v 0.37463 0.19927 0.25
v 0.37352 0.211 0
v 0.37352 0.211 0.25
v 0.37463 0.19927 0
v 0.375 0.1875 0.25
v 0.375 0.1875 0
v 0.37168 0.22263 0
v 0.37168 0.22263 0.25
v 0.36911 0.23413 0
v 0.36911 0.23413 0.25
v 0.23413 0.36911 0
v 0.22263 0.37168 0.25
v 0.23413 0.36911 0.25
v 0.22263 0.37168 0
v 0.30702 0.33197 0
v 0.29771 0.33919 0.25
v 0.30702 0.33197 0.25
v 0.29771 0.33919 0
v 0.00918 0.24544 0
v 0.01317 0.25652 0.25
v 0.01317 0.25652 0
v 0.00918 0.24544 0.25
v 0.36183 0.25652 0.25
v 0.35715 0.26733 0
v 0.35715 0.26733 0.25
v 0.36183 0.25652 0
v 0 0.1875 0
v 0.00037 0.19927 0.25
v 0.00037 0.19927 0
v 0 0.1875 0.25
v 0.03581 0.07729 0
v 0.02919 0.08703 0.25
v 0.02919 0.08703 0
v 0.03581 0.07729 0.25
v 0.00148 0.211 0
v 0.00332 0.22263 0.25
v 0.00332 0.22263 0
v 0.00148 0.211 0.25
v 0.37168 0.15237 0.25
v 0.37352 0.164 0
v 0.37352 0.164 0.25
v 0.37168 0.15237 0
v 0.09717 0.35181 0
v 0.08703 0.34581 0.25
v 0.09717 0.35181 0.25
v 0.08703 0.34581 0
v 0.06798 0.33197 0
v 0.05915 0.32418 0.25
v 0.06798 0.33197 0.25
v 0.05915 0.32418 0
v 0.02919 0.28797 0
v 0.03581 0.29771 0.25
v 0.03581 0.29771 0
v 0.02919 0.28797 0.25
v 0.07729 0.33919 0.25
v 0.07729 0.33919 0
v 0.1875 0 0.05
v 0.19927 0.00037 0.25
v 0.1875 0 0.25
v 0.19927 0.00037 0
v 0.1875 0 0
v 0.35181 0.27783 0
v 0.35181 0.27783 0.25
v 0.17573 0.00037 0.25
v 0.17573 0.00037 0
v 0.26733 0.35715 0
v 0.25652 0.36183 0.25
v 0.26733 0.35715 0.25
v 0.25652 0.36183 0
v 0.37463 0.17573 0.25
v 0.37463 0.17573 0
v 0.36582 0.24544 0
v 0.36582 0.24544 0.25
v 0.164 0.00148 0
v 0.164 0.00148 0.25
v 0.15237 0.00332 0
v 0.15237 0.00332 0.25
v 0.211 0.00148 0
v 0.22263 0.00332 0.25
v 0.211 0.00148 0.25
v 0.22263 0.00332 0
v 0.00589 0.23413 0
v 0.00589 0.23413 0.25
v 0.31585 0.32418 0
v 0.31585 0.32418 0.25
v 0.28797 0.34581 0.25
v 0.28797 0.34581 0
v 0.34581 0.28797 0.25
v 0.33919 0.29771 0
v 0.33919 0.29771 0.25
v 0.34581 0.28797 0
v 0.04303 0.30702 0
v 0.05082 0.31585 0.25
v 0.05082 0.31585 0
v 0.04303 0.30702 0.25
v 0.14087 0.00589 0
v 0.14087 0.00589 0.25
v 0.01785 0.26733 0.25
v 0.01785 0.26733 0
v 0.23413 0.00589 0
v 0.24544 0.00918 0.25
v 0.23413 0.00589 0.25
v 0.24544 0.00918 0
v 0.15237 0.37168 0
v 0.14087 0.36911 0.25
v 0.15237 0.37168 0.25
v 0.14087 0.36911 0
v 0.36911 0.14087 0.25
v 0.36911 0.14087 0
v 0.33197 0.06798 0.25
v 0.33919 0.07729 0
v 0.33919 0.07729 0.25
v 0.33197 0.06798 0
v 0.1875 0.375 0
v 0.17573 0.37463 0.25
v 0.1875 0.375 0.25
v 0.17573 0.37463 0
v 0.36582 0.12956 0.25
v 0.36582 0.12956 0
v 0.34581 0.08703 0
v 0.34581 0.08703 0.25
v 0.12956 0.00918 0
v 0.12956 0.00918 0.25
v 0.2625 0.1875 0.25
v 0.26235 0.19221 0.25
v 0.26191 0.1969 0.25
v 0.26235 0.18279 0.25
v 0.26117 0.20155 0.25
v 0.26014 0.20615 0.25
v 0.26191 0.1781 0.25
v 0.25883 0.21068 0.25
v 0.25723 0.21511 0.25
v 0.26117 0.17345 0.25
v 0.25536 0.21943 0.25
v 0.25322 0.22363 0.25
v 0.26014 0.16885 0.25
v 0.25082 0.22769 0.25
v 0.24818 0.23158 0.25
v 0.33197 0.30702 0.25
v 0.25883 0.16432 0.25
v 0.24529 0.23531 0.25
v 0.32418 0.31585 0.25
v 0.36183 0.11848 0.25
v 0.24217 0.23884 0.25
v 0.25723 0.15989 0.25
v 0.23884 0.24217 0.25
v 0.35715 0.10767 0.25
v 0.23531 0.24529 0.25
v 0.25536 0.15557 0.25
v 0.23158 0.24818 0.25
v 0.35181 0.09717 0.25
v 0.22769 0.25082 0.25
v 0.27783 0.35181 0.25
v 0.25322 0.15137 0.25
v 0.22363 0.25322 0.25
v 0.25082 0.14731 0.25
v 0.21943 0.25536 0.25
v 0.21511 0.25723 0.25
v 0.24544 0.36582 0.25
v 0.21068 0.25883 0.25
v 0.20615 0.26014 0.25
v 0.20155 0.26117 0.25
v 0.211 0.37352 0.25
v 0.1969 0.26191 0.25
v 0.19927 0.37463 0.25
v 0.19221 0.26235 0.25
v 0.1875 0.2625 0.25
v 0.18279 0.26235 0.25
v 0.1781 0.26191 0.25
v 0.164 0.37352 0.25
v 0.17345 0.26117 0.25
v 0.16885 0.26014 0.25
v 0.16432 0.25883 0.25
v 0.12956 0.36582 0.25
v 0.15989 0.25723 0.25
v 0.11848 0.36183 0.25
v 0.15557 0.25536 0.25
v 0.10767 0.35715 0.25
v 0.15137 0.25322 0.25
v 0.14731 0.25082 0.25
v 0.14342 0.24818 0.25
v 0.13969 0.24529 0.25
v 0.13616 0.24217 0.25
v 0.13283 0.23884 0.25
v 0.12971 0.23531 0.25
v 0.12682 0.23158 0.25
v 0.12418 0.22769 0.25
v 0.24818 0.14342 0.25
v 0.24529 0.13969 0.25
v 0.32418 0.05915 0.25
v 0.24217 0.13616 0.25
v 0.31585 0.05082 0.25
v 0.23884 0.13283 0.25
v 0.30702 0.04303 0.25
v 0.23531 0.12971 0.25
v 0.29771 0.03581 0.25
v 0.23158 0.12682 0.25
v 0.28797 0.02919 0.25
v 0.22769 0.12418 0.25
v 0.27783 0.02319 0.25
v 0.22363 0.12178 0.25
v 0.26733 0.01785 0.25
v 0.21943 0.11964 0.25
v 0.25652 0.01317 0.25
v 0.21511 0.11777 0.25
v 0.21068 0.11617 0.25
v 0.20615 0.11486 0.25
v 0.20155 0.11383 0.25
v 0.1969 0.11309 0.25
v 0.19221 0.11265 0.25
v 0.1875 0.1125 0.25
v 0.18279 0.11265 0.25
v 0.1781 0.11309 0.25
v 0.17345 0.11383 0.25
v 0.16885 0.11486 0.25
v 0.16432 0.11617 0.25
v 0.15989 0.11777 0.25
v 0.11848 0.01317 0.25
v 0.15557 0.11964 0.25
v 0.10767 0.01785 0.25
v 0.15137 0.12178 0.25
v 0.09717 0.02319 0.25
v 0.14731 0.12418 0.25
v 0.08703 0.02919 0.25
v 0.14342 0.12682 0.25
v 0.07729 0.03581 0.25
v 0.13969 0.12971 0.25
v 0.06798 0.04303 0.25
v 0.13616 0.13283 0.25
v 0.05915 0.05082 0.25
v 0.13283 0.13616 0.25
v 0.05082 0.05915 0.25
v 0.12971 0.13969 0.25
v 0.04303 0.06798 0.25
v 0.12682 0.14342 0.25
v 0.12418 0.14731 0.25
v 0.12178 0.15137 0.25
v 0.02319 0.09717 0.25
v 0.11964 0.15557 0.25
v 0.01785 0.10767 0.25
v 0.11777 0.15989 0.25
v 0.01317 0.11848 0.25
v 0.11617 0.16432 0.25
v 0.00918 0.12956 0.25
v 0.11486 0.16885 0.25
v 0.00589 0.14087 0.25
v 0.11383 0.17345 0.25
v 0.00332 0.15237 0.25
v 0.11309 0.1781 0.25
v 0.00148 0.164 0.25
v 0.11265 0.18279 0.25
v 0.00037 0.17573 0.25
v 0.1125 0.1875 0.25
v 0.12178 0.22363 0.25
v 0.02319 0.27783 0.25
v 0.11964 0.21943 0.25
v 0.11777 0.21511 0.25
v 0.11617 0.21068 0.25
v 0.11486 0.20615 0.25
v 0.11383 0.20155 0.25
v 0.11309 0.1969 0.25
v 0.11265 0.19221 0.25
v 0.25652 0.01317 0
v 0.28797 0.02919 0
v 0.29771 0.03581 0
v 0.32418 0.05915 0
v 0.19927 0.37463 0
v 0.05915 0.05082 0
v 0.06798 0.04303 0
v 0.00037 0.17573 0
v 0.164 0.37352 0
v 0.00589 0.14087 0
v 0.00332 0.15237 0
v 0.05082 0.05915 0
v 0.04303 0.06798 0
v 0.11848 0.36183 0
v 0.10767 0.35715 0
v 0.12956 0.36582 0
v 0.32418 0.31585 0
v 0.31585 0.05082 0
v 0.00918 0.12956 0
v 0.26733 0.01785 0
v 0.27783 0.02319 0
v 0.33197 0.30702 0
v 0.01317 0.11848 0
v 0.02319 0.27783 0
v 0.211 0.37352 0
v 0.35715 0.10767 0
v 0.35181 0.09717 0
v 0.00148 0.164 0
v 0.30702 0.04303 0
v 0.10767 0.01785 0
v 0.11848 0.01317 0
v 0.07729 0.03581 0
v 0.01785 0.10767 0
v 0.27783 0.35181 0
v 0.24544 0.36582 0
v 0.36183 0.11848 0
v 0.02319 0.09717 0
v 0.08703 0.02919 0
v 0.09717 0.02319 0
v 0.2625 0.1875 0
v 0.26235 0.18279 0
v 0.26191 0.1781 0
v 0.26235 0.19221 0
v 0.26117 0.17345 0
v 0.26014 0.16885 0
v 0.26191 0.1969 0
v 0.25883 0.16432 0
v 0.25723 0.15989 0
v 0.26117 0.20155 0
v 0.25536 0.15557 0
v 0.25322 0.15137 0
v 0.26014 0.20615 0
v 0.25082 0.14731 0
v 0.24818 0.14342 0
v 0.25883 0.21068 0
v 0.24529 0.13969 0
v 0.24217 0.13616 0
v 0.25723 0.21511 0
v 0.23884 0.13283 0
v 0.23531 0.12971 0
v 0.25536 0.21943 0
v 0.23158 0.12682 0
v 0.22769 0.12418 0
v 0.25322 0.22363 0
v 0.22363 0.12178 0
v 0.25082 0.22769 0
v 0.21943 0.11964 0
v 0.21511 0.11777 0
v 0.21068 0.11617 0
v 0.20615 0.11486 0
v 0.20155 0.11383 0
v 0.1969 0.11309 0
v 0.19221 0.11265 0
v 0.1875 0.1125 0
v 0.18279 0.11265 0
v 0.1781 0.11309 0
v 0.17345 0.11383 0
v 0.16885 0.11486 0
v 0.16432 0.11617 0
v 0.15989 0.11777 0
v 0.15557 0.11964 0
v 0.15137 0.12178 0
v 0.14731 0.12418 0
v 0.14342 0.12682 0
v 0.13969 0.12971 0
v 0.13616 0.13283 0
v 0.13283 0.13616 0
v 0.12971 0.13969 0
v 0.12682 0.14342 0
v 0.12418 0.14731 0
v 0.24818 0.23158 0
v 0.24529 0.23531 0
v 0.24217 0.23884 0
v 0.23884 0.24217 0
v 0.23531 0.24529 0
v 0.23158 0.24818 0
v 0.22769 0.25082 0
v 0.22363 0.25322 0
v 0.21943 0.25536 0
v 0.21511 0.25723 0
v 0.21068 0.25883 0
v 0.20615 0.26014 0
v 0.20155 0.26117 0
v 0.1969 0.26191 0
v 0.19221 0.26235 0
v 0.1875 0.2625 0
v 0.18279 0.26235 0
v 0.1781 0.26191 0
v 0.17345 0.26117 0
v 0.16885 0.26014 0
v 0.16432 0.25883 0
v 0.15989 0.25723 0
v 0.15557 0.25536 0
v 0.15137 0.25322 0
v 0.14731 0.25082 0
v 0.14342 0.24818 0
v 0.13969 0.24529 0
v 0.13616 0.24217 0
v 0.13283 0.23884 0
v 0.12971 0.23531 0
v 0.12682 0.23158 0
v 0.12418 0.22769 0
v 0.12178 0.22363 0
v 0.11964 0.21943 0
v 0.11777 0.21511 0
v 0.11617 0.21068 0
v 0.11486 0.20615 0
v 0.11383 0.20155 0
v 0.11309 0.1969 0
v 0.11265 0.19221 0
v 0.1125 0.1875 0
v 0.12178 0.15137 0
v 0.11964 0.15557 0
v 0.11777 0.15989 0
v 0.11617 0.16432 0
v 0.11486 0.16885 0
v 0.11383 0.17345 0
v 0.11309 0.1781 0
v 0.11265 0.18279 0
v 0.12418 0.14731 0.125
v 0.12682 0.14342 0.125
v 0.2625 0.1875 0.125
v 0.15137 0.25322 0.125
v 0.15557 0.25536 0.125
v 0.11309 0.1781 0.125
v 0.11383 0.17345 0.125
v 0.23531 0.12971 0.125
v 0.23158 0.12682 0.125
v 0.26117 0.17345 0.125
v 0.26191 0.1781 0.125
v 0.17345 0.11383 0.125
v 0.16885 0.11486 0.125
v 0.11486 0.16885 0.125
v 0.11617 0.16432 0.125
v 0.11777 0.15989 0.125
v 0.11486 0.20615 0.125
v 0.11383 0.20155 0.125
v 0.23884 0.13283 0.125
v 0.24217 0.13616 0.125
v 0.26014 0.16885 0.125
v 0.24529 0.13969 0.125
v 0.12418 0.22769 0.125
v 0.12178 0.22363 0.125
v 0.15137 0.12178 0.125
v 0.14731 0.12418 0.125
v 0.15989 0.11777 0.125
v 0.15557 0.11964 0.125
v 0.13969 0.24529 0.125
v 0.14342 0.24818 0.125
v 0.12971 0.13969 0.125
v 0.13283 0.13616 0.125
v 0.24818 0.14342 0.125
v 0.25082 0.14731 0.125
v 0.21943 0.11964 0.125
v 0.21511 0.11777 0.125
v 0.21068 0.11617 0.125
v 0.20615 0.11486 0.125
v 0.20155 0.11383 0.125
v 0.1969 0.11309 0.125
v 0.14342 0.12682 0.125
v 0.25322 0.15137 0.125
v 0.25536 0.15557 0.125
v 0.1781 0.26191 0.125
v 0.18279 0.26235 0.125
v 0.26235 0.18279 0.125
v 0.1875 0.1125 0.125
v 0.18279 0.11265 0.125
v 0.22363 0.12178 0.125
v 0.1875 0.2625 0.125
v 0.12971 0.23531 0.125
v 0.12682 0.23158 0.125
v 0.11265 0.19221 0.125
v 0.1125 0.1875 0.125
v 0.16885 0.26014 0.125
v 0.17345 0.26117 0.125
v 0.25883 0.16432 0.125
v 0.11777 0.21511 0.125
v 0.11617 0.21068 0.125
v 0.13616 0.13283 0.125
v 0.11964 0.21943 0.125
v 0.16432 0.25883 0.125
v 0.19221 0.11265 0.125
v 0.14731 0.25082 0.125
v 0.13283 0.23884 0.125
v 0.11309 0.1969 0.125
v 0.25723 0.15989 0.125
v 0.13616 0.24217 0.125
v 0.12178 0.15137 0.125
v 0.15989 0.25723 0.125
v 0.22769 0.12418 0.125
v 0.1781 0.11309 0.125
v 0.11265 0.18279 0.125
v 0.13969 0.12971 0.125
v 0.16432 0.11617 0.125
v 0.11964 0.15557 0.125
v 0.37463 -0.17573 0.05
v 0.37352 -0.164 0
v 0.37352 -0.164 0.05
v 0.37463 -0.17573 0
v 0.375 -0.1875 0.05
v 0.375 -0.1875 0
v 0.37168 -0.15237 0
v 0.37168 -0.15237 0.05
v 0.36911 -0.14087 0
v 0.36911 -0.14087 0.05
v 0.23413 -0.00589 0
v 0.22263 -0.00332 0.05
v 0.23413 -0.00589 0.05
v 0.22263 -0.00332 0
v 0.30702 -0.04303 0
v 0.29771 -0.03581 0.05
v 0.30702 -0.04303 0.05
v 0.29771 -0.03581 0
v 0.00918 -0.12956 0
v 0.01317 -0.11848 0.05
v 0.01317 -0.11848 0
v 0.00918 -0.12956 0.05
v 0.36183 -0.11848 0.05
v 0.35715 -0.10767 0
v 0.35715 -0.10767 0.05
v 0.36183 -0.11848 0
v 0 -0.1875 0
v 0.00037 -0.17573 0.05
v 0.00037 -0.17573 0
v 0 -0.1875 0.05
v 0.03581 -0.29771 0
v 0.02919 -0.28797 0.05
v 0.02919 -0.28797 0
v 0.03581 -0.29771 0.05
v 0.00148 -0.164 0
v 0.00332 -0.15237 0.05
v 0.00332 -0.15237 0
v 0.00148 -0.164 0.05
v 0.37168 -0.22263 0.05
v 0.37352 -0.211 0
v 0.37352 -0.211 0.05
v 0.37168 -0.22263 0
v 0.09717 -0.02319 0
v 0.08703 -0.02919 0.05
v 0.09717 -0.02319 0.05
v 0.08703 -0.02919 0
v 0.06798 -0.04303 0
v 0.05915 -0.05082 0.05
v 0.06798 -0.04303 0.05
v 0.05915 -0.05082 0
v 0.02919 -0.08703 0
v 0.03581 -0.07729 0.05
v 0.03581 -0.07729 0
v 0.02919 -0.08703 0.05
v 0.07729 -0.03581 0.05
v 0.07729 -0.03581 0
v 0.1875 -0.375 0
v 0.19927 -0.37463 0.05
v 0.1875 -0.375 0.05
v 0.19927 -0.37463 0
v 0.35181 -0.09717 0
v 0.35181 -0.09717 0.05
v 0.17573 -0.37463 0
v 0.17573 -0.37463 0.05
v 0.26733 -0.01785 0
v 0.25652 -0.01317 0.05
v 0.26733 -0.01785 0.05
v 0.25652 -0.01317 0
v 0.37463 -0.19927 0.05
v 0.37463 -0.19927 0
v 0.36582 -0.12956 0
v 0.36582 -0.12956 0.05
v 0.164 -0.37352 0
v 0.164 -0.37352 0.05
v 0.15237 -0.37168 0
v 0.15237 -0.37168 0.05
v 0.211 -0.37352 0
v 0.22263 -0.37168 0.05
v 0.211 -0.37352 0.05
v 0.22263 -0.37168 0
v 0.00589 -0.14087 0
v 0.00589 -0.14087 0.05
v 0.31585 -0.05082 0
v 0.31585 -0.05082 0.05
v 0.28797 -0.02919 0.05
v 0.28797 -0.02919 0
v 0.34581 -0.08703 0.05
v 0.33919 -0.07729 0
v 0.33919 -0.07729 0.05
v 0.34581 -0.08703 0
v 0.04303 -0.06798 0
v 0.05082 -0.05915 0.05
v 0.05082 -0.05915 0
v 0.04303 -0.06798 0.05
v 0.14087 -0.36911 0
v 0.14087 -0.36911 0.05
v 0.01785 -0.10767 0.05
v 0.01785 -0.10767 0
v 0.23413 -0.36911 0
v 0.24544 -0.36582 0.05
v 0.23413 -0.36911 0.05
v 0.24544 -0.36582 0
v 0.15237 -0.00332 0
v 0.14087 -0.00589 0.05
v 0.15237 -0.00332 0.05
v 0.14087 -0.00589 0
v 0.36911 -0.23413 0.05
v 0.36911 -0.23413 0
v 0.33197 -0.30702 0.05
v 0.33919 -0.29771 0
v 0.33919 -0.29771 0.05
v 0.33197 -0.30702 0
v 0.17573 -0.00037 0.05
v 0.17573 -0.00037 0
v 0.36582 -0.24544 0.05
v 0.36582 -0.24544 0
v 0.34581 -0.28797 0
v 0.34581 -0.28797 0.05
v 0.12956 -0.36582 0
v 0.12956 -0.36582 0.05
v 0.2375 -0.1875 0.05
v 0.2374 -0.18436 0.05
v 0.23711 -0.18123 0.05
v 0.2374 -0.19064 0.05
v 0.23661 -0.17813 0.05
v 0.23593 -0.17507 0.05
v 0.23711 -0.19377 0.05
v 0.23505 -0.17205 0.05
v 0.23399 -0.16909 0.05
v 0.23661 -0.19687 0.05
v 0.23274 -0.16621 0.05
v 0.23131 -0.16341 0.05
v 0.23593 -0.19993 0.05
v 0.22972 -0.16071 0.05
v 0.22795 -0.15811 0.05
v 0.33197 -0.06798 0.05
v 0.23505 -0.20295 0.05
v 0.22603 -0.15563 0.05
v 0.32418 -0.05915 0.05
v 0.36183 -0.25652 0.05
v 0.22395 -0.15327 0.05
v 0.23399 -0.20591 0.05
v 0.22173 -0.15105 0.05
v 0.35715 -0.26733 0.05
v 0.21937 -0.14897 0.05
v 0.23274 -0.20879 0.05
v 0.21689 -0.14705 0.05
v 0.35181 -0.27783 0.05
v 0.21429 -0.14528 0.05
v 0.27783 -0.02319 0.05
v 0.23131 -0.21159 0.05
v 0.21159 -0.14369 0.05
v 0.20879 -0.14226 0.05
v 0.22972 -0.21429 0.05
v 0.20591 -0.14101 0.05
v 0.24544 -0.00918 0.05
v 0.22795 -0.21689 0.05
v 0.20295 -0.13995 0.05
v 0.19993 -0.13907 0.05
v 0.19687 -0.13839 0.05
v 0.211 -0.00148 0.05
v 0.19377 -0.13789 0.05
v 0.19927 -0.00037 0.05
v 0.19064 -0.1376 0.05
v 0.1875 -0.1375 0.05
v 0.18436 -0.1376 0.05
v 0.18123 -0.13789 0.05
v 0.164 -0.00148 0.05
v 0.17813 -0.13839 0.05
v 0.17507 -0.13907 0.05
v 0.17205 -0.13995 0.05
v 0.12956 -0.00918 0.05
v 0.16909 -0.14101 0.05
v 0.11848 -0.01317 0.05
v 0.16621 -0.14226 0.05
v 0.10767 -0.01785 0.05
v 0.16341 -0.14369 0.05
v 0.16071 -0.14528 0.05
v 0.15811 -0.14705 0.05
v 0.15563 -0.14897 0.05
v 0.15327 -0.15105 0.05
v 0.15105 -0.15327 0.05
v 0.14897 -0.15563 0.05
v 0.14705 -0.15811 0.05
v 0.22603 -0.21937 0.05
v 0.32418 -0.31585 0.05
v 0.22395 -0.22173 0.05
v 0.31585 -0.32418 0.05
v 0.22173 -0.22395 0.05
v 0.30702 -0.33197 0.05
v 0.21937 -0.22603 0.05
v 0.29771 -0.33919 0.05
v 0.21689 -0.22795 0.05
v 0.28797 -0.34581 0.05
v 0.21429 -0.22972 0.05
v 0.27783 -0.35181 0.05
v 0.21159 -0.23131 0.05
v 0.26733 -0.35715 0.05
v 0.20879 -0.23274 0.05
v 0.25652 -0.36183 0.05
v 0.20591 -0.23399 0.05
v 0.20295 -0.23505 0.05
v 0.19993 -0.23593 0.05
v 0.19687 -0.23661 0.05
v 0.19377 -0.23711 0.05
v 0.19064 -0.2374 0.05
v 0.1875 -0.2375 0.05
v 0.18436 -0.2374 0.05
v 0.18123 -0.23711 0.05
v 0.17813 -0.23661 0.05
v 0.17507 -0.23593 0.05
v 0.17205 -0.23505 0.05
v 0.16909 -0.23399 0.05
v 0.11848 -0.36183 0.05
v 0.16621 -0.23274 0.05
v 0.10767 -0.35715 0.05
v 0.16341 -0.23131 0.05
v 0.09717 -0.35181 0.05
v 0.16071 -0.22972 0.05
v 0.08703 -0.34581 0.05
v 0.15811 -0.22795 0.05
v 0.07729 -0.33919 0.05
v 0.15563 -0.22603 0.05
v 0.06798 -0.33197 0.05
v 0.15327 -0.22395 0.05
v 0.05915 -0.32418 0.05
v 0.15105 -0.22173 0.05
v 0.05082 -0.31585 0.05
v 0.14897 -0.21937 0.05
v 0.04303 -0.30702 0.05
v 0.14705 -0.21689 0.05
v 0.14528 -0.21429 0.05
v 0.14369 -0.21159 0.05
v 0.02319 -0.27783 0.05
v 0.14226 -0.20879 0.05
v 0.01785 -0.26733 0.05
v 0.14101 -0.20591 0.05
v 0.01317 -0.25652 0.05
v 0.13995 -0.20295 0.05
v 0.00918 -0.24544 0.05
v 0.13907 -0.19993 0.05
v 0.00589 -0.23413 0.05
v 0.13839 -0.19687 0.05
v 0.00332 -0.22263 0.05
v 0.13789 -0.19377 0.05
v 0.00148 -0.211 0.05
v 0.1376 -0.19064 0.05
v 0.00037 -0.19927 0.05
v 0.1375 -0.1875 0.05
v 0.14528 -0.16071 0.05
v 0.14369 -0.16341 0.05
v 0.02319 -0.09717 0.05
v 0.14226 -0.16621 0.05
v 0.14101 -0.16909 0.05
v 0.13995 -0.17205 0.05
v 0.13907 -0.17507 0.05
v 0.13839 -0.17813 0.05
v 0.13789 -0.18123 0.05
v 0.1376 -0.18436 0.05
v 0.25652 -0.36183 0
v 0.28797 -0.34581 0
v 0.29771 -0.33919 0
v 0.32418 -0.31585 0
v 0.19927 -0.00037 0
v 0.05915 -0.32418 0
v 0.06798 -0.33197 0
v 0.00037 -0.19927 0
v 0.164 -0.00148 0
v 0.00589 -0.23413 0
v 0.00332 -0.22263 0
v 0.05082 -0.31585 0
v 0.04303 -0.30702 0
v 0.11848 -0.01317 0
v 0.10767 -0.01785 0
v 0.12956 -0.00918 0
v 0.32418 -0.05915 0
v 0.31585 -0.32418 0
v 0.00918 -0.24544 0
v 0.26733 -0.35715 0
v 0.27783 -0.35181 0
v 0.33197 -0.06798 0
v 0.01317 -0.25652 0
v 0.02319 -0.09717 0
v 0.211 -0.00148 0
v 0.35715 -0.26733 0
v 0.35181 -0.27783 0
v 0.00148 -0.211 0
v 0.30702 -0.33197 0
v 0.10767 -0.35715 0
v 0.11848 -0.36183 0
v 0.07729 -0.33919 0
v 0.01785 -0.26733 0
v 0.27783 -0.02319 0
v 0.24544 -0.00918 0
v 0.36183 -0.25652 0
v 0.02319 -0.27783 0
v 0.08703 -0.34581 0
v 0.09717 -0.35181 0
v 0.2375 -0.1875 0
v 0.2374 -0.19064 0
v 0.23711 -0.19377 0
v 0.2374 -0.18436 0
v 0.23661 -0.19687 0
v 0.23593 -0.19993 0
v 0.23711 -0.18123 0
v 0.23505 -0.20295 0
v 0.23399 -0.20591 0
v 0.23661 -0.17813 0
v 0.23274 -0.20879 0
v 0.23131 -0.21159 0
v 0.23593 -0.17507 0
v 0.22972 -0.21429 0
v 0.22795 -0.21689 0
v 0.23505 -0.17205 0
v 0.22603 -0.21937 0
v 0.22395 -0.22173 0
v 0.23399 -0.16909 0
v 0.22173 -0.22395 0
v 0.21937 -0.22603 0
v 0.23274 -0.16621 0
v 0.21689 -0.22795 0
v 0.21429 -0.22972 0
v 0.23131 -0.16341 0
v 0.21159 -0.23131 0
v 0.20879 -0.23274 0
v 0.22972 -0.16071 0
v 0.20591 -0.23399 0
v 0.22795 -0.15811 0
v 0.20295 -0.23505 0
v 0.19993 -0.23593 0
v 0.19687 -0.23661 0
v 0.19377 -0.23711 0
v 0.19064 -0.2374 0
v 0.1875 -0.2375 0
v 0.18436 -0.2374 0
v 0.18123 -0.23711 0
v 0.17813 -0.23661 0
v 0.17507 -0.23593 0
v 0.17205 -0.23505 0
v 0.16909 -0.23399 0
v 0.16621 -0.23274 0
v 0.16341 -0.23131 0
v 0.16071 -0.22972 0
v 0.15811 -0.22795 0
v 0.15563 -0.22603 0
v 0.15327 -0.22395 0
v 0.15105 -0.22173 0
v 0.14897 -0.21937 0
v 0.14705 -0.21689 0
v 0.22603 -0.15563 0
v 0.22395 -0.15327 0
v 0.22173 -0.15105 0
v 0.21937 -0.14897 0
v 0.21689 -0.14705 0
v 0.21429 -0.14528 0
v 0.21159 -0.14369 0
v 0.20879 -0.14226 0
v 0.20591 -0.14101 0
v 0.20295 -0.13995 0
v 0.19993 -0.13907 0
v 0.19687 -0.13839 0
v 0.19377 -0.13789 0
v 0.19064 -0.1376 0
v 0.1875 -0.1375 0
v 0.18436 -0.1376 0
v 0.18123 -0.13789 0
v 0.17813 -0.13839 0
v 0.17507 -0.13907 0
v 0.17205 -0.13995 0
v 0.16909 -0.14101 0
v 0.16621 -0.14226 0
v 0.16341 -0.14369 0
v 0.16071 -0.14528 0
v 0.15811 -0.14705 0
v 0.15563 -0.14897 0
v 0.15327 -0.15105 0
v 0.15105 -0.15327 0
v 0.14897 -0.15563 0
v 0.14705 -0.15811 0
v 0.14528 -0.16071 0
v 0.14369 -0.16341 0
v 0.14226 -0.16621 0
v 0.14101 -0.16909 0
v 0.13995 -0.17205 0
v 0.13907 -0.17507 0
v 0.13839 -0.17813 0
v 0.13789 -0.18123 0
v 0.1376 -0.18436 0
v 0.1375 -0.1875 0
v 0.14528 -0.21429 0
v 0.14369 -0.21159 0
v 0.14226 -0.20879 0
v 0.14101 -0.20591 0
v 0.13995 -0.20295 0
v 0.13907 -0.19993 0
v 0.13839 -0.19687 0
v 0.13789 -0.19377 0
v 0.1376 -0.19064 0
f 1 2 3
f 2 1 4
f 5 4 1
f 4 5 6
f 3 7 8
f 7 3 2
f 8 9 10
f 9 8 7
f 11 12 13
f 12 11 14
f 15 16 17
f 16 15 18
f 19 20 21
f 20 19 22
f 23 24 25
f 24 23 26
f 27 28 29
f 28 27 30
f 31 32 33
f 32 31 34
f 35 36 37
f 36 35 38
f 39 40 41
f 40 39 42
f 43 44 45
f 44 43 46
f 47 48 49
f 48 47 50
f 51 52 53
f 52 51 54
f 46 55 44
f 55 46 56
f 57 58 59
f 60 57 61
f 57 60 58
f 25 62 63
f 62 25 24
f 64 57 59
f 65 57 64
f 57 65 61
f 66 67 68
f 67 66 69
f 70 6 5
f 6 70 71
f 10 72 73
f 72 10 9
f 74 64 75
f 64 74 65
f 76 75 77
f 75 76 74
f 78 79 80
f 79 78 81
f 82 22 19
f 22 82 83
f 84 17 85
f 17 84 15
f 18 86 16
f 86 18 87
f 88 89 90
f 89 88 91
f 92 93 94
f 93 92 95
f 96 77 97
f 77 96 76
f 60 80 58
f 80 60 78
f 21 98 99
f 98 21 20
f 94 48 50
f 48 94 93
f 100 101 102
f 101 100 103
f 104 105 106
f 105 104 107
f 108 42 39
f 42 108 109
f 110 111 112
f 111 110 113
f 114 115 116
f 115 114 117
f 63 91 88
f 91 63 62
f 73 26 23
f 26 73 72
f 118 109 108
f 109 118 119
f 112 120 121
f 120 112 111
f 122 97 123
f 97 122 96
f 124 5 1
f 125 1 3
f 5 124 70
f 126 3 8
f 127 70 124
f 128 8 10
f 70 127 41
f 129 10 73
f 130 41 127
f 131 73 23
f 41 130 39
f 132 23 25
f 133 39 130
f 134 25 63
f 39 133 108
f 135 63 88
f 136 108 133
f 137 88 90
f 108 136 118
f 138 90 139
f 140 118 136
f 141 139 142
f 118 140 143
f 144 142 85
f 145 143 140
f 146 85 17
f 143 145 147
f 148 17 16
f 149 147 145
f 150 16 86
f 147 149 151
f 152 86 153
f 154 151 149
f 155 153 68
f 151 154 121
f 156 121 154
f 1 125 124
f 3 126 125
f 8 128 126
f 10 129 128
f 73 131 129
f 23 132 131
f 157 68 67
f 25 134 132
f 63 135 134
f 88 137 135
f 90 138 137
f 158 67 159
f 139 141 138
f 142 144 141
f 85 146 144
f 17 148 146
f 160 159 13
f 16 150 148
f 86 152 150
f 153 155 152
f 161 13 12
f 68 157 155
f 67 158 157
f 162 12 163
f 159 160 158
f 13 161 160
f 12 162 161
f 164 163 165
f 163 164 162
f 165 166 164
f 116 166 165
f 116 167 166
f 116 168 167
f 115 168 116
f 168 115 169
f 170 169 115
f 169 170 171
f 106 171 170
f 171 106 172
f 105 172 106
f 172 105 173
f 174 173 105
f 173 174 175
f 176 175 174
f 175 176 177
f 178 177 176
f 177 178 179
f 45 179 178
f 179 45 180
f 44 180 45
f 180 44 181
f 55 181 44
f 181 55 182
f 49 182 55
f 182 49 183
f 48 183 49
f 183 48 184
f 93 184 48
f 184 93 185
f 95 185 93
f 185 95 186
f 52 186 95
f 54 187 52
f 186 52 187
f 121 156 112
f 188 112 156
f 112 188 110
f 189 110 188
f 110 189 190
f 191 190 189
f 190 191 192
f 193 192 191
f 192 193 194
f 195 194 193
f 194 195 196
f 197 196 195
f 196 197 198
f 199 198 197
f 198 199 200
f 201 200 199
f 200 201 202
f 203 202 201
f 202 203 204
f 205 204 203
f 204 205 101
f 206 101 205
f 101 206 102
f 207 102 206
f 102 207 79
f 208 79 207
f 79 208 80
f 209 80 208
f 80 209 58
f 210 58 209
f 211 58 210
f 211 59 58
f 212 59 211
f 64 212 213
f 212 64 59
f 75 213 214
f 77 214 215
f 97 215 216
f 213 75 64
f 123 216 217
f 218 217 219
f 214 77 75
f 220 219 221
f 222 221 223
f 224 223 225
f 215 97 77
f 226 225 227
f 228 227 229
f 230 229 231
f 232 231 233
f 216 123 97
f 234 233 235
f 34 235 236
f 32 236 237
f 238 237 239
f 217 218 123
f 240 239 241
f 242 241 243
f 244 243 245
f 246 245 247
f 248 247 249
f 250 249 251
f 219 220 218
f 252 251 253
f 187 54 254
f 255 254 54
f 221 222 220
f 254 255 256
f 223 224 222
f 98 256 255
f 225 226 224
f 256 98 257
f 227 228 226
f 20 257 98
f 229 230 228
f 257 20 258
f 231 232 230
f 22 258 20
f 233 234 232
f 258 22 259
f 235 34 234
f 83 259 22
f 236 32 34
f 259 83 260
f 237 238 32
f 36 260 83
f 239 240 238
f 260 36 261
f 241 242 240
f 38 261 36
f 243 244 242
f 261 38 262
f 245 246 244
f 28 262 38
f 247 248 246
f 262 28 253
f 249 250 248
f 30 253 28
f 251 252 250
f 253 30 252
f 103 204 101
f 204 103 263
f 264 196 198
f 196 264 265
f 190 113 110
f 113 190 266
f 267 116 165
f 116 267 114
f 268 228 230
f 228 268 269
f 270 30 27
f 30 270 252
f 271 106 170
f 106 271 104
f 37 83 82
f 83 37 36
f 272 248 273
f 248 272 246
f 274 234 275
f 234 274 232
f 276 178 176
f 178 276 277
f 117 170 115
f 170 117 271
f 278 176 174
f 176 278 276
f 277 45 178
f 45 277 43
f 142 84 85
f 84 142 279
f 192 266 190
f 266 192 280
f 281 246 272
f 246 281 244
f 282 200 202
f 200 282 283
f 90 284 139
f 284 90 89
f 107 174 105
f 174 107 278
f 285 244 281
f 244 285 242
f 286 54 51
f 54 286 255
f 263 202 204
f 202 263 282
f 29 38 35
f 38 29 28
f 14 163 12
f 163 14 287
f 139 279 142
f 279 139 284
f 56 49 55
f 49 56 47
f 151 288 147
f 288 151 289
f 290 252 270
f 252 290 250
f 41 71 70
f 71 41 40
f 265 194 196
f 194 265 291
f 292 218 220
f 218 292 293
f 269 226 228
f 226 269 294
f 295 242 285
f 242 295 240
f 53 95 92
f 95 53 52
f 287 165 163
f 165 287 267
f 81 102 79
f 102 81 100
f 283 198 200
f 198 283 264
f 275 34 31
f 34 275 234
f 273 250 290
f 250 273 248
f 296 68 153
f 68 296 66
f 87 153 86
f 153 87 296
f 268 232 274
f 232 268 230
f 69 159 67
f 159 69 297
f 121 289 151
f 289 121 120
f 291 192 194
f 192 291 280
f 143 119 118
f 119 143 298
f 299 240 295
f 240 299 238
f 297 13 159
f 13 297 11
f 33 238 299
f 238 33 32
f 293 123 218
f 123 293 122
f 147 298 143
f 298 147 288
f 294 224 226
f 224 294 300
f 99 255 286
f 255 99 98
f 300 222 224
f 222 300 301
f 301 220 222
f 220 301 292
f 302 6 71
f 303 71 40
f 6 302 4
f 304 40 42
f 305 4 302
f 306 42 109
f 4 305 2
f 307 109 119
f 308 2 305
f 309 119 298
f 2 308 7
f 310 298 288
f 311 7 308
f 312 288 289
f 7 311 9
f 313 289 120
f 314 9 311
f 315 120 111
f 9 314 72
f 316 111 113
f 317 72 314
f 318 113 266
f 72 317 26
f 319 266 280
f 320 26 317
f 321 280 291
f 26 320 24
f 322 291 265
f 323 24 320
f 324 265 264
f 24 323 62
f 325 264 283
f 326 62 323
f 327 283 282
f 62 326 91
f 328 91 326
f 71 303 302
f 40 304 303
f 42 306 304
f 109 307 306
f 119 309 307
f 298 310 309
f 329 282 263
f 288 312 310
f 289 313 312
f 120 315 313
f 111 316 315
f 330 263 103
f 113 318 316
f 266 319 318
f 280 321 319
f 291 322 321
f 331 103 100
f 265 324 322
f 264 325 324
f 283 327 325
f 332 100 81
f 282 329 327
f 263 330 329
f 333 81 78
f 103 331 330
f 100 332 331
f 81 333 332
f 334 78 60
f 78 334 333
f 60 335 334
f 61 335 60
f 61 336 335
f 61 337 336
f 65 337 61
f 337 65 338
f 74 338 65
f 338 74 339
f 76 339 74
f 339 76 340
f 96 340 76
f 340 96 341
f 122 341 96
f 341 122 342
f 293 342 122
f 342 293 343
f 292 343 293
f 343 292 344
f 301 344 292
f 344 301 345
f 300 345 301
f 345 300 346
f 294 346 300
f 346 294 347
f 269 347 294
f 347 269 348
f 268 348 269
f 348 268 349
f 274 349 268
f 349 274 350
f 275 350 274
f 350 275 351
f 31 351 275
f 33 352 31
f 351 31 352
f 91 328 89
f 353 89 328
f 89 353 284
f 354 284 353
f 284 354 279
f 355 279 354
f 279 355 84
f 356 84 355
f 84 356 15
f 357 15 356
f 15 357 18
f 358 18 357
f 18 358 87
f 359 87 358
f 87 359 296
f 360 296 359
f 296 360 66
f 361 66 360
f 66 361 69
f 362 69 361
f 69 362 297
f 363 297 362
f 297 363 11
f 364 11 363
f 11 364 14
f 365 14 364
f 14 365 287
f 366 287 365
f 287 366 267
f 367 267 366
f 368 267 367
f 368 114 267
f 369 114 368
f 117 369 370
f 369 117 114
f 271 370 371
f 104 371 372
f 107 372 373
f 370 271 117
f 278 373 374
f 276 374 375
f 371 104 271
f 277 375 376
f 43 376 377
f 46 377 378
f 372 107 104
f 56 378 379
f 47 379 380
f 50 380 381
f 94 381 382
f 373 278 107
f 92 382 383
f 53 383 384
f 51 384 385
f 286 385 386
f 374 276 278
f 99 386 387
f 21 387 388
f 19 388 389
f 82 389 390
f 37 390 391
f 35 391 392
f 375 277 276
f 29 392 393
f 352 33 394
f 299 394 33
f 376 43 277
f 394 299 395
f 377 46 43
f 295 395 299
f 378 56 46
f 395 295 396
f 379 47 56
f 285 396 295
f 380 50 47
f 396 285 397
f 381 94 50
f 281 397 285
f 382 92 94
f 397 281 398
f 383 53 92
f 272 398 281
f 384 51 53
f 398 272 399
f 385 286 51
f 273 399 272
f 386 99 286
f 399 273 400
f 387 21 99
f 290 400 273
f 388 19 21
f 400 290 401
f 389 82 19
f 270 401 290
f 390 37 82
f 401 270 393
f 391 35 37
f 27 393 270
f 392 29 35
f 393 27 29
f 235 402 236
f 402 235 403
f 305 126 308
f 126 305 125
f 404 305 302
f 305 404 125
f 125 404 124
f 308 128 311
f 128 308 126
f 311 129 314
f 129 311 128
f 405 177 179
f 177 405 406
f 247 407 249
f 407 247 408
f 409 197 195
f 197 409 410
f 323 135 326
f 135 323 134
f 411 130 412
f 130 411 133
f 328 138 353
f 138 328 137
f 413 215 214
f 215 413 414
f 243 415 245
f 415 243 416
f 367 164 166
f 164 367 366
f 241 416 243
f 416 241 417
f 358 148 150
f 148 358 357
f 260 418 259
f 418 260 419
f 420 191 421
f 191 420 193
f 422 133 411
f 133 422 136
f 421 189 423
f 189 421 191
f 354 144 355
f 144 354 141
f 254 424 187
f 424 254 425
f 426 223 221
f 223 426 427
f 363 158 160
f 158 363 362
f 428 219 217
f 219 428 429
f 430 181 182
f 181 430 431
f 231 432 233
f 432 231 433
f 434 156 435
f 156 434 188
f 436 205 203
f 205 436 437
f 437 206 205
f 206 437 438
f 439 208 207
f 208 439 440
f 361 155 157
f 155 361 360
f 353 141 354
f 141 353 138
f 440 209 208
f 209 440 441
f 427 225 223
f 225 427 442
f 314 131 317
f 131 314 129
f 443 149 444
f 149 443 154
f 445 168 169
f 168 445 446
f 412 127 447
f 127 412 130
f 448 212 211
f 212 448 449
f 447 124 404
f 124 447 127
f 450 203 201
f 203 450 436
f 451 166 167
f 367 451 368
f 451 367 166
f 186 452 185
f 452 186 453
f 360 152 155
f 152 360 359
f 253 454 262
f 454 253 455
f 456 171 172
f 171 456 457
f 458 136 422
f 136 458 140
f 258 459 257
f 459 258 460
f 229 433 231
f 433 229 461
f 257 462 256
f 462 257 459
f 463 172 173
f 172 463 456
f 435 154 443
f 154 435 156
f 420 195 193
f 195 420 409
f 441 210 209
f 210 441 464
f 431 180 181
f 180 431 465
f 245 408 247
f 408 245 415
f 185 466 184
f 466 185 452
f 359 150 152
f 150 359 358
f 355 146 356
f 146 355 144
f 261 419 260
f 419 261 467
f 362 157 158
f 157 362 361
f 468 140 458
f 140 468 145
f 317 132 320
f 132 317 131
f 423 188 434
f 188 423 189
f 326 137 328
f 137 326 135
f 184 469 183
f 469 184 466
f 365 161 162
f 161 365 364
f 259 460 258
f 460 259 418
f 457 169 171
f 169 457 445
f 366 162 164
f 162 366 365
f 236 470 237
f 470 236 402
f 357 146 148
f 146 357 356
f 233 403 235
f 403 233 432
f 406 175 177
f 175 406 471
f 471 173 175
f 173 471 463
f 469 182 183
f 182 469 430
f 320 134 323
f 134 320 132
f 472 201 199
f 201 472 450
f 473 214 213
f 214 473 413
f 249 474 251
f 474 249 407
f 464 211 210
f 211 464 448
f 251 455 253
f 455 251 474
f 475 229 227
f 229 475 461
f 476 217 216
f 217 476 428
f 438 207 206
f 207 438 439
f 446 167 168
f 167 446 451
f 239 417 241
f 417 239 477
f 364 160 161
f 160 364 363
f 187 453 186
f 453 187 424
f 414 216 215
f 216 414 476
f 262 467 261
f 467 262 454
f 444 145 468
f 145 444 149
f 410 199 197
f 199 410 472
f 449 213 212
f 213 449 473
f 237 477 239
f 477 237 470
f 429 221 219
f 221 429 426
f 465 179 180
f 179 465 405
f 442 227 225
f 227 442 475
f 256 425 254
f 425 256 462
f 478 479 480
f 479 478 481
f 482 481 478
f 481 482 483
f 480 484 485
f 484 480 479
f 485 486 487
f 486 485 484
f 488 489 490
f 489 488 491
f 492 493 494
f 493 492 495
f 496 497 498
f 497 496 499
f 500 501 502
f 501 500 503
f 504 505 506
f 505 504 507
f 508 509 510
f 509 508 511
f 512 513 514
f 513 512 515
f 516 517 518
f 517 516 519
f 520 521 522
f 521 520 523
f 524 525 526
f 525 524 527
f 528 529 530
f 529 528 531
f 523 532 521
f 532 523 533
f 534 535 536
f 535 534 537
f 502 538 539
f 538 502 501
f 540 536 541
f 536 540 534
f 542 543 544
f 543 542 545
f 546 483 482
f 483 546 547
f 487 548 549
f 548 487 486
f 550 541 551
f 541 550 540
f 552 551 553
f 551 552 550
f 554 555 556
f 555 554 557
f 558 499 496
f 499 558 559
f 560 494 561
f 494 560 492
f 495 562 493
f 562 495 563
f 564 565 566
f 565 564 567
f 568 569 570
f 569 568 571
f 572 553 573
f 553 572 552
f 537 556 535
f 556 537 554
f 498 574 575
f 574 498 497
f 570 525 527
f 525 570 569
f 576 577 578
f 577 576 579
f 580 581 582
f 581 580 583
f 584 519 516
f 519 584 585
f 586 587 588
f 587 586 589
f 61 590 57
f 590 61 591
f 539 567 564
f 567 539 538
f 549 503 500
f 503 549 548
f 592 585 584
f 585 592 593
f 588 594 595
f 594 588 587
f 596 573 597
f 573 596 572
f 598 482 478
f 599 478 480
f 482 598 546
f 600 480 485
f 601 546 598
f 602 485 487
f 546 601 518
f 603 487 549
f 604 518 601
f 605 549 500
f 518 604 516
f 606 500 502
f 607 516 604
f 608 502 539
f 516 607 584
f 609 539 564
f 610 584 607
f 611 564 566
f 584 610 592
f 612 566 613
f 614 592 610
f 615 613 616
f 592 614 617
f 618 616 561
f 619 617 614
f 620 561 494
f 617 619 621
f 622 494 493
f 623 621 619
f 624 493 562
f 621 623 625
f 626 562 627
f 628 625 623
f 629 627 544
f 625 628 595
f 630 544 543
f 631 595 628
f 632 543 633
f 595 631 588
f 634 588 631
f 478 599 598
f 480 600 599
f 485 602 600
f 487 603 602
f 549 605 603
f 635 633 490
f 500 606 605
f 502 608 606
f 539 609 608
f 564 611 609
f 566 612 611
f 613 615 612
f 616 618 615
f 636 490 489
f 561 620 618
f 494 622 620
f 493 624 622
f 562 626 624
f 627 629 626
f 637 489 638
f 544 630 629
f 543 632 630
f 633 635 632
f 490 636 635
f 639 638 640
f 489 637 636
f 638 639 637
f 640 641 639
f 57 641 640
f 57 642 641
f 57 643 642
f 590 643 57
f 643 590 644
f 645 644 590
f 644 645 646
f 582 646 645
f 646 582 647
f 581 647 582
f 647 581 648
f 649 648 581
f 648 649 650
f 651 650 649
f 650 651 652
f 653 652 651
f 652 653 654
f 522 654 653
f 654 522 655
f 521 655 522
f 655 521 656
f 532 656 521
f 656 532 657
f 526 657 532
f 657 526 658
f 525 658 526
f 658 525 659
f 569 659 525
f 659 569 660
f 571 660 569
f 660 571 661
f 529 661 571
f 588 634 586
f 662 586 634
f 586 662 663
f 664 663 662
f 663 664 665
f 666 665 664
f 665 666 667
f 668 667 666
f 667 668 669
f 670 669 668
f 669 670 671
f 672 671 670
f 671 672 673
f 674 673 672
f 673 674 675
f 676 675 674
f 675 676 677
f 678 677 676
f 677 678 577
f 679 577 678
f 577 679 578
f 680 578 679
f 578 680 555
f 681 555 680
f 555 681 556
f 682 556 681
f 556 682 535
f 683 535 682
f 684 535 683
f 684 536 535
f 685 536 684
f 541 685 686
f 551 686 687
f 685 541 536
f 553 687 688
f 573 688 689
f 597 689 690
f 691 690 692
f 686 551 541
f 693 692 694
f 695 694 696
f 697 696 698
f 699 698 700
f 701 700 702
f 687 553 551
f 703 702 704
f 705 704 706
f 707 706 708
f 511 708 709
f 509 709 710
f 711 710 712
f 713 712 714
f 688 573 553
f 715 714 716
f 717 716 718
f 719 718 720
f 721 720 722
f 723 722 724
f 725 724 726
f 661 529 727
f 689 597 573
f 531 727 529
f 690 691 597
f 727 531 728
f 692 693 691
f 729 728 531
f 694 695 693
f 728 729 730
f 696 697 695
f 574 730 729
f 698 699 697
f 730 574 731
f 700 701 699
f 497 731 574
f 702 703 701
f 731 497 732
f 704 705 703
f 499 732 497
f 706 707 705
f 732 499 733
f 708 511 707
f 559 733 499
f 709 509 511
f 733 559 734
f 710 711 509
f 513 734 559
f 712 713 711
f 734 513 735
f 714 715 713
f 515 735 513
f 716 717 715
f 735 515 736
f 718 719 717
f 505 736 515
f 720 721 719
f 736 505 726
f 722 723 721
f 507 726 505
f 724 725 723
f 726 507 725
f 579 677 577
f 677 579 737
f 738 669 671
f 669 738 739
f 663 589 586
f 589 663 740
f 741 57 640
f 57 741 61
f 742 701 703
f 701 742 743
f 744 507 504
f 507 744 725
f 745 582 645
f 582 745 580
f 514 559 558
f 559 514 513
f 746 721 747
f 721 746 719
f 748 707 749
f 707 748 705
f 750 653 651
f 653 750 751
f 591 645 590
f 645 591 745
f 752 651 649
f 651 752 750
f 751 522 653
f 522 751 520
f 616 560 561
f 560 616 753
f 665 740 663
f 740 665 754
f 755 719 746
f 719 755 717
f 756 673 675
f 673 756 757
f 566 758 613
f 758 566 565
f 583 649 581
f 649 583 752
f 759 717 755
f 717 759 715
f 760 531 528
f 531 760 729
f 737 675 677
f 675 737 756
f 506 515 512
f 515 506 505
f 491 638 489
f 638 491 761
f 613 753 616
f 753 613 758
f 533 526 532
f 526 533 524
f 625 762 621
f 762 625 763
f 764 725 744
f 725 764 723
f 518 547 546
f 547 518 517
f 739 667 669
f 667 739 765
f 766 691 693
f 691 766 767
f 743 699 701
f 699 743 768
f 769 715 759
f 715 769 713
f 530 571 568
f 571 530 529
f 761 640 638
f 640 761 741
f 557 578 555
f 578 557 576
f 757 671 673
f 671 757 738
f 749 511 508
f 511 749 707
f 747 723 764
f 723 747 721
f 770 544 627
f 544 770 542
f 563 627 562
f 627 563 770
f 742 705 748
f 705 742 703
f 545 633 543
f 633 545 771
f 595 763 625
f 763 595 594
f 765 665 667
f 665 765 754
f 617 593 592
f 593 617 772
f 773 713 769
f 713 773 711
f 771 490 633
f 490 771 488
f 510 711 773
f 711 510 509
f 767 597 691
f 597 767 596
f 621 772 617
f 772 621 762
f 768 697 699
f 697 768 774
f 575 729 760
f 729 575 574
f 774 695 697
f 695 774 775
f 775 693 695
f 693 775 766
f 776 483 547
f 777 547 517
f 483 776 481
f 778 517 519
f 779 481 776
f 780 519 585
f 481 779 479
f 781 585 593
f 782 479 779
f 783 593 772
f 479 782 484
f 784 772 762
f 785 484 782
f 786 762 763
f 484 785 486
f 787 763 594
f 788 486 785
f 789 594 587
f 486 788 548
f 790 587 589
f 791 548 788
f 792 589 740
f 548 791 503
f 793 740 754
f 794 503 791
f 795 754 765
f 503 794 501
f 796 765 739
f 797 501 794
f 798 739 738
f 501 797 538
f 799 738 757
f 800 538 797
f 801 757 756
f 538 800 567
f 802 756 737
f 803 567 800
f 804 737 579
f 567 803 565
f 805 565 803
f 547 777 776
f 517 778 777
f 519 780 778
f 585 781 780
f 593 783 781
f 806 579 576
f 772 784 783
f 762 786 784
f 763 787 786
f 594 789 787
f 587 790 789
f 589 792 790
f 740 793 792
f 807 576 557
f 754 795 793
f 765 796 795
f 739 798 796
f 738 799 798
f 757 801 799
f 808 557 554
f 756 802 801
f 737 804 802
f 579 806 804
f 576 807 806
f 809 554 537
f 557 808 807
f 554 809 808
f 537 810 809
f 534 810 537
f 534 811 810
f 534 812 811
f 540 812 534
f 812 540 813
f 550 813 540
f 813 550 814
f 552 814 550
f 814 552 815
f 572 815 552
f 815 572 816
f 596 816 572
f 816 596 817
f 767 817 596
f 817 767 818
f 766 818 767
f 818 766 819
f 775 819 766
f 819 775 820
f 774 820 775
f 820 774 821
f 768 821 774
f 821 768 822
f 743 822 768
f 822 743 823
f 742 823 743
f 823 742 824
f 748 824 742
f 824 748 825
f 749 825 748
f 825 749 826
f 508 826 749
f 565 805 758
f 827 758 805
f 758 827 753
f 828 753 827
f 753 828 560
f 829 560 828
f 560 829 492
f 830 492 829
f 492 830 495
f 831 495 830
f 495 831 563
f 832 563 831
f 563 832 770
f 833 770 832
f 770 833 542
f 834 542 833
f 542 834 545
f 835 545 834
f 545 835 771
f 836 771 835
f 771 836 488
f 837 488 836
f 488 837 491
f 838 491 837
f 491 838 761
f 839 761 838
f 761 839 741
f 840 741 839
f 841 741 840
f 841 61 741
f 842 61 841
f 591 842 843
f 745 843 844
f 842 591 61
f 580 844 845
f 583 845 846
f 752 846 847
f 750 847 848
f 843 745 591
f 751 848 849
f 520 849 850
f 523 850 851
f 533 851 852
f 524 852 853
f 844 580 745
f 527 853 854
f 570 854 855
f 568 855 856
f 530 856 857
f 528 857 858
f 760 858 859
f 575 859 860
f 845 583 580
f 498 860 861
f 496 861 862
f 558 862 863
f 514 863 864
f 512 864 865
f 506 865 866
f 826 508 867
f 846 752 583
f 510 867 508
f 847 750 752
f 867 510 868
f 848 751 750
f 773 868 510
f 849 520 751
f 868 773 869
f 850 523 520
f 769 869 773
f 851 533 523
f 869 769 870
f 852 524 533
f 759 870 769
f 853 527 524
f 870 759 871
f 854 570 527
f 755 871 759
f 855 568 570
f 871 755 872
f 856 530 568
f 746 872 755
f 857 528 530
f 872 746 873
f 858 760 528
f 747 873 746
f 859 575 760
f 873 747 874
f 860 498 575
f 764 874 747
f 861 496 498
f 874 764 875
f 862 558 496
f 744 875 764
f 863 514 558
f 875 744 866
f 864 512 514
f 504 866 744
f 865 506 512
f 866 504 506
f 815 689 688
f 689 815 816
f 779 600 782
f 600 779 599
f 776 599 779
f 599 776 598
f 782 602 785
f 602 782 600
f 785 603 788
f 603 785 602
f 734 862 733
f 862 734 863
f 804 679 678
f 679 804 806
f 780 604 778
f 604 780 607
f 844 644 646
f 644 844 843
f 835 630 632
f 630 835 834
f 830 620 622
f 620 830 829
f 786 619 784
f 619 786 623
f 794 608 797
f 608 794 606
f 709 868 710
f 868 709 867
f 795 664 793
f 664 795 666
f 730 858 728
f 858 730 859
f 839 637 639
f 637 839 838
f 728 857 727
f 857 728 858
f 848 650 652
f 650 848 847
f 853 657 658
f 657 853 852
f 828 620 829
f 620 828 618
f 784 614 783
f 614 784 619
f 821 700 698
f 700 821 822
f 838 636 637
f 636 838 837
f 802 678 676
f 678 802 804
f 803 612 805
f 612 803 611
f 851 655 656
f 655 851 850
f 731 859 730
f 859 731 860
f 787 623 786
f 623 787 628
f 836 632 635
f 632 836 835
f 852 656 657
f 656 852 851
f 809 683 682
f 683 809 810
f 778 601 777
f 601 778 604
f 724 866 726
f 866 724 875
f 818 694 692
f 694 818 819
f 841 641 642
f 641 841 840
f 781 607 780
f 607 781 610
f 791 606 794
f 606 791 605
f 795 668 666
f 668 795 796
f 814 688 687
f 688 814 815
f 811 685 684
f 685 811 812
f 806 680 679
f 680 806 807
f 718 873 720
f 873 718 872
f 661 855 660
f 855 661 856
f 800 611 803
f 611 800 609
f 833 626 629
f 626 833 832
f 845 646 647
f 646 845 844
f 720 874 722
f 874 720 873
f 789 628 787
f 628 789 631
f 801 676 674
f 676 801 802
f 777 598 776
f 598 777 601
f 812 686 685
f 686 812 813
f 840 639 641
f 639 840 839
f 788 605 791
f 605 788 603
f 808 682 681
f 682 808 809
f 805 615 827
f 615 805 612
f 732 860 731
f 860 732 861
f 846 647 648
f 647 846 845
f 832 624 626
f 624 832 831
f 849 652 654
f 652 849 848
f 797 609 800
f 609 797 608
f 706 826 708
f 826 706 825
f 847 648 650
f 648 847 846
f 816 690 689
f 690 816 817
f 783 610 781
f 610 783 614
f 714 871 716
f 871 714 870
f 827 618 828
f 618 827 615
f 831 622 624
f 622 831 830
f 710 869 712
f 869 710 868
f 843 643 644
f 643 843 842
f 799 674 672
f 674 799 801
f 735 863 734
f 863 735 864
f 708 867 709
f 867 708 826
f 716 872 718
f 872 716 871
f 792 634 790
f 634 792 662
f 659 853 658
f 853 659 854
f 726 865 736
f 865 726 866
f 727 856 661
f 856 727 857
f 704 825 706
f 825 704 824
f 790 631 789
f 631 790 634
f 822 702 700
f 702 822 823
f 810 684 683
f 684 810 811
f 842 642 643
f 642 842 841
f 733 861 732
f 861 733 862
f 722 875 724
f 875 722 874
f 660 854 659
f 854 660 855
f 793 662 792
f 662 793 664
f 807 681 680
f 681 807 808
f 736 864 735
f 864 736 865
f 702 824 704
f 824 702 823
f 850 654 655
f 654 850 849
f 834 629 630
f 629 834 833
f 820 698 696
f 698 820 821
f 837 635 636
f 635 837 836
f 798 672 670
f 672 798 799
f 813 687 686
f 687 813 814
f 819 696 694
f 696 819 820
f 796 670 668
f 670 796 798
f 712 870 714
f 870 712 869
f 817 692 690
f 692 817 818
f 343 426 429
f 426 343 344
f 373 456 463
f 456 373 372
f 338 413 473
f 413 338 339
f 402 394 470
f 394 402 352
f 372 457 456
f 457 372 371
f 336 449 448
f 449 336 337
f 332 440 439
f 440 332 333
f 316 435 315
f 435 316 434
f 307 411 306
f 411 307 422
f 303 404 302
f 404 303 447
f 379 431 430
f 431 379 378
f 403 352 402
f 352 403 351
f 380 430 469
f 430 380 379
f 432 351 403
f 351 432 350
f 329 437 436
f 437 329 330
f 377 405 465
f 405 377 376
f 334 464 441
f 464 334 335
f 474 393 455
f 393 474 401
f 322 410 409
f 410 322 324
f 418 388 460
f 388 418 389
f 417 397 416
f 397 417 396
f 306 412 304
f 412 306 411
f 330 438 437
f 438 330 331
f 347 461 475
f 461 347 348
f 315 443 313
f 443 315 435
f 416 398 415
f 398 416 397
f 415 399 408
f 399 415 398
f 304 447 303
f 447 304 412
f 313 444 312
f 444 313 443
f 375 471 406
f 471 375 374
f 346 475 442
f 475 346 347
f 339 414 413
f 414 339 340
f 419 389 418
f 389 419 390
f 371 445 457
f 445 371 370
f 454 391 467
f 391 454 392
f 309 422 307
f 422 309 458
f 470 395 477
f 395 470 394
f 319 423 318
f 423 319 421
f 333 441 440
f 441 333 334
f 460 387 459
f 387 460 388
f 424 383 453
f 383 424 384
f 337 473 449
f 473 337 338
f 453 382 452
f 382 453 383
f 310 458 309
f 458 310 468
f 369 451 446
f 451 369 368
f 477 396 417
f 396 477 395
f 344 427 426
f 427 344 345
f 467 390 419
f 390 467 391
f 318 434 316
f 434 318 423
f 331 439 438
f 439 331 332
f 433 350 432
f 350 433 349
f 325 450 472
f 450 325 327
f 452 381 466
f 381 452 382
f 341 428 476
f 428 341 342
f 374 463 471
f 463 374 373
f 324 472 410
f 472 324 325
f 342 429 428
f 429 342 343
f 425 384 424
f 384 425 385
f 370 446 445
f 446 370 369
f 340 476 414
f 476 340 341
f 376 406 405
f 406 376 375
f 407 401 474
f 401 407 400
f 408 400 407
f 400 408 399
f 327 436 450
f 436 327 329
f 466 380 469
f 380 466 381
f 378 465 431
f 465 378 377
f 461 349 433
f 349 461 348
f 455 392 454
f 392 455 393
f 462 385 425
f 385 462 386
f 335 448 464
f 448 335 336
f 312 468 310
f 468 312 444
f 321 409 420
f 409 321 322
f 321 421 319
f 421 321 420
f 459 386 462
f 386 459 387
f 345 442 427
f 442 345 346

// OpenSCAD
// === Parameters ===

// Main reference dimensions
main_length = 0.375;
main_width = 0.375;
main_height = 0.25;

// Main annular cylinder (sleeve)
main_cx = 0.1875;       // Center x offset from left edge
main_cy = 0.1875;       // Center y offset from front edge
main_outer_r = 0.1875;  // Outer radius
main_bore_r = 0.075;    // Through bore radius
// Wall thickness = 0.1875 - 0.075 = 0.1125

// Shallow attached annular tab
tab_cx = 0.1875;        // Center x offset from left edge
tab_cy = -0.1875;       // Center y offset from front edge (extends forward)
tab_outer_r = 0.1875;   // Outer radius
tab_bore_r = 0.05;      // Through opening radius
tab_height = 0.05;      // Height from underside datum
// Wall thickness = 0.1875 - 0.05 = 0.1375
// Bounding span: 0.375 x 0.5625 (left 0, right 0, front -0.375, back 0.1875)

// Underside recess/cut
recess_cx = 0.1875;     // Centered on main axis
recess_cy = 0.1875;     // Centered on main axis
recess_r = 0.075;       // Circular cut radius
recess_depth = 0.125;   // Depth from underside (z=0 to z=0.125)
// Bounded footprint: 0.2557 x 0.2884
// Offsets: left 0.0597, right 0.0596, front 0.0433, back 0.0433

$fn = 100;

// === Modules ===

// Main sleeve: annular cylinder with through bore
module main_sleeve() {
    difference() {
        cylinder(h=main_height, r=main_outer_r);
        // Through bore extends slightly to ensure clean cut
        translate([0, 0, -0.001])
            cylinder(h=main_height + 0.002, r=main_bore_r);
    }
}

// Shallow tab: annular cylinder with through opening
module shallow_tab() {
    difference() {
        cylinder(h=tab_height, r=tab_outer_r);
        // Through opening extends slightly to ensure clean cut
        translate([0, 0, -0.001])
            cylinder(h=tab_height + 0.002, r=tab_bore_r);
    }
}

// Underside recess: circular pocket on underside of main sleeve
module underside_recess() {
    translate([0, 0, -0.001])
        cylinder(h=recess_depth + 0.001, r=recess_r);
}

// === Assembly ===

difference() {
    // Union of main sleeve and shallow tab
    union() {
        // Main annular cylinder positioned at specified center
        translate([main_cx, main_cy, 0])
            main_sleeve();

        // Shallow annular tab positioned at specified center
        translate([tab_cx, tab_cy, 0])
            shallow_tab();
    }

    // Underside recess cut on main axis
    translate([recess_cx, recess_cy, 0])
        underside_recess();
}
